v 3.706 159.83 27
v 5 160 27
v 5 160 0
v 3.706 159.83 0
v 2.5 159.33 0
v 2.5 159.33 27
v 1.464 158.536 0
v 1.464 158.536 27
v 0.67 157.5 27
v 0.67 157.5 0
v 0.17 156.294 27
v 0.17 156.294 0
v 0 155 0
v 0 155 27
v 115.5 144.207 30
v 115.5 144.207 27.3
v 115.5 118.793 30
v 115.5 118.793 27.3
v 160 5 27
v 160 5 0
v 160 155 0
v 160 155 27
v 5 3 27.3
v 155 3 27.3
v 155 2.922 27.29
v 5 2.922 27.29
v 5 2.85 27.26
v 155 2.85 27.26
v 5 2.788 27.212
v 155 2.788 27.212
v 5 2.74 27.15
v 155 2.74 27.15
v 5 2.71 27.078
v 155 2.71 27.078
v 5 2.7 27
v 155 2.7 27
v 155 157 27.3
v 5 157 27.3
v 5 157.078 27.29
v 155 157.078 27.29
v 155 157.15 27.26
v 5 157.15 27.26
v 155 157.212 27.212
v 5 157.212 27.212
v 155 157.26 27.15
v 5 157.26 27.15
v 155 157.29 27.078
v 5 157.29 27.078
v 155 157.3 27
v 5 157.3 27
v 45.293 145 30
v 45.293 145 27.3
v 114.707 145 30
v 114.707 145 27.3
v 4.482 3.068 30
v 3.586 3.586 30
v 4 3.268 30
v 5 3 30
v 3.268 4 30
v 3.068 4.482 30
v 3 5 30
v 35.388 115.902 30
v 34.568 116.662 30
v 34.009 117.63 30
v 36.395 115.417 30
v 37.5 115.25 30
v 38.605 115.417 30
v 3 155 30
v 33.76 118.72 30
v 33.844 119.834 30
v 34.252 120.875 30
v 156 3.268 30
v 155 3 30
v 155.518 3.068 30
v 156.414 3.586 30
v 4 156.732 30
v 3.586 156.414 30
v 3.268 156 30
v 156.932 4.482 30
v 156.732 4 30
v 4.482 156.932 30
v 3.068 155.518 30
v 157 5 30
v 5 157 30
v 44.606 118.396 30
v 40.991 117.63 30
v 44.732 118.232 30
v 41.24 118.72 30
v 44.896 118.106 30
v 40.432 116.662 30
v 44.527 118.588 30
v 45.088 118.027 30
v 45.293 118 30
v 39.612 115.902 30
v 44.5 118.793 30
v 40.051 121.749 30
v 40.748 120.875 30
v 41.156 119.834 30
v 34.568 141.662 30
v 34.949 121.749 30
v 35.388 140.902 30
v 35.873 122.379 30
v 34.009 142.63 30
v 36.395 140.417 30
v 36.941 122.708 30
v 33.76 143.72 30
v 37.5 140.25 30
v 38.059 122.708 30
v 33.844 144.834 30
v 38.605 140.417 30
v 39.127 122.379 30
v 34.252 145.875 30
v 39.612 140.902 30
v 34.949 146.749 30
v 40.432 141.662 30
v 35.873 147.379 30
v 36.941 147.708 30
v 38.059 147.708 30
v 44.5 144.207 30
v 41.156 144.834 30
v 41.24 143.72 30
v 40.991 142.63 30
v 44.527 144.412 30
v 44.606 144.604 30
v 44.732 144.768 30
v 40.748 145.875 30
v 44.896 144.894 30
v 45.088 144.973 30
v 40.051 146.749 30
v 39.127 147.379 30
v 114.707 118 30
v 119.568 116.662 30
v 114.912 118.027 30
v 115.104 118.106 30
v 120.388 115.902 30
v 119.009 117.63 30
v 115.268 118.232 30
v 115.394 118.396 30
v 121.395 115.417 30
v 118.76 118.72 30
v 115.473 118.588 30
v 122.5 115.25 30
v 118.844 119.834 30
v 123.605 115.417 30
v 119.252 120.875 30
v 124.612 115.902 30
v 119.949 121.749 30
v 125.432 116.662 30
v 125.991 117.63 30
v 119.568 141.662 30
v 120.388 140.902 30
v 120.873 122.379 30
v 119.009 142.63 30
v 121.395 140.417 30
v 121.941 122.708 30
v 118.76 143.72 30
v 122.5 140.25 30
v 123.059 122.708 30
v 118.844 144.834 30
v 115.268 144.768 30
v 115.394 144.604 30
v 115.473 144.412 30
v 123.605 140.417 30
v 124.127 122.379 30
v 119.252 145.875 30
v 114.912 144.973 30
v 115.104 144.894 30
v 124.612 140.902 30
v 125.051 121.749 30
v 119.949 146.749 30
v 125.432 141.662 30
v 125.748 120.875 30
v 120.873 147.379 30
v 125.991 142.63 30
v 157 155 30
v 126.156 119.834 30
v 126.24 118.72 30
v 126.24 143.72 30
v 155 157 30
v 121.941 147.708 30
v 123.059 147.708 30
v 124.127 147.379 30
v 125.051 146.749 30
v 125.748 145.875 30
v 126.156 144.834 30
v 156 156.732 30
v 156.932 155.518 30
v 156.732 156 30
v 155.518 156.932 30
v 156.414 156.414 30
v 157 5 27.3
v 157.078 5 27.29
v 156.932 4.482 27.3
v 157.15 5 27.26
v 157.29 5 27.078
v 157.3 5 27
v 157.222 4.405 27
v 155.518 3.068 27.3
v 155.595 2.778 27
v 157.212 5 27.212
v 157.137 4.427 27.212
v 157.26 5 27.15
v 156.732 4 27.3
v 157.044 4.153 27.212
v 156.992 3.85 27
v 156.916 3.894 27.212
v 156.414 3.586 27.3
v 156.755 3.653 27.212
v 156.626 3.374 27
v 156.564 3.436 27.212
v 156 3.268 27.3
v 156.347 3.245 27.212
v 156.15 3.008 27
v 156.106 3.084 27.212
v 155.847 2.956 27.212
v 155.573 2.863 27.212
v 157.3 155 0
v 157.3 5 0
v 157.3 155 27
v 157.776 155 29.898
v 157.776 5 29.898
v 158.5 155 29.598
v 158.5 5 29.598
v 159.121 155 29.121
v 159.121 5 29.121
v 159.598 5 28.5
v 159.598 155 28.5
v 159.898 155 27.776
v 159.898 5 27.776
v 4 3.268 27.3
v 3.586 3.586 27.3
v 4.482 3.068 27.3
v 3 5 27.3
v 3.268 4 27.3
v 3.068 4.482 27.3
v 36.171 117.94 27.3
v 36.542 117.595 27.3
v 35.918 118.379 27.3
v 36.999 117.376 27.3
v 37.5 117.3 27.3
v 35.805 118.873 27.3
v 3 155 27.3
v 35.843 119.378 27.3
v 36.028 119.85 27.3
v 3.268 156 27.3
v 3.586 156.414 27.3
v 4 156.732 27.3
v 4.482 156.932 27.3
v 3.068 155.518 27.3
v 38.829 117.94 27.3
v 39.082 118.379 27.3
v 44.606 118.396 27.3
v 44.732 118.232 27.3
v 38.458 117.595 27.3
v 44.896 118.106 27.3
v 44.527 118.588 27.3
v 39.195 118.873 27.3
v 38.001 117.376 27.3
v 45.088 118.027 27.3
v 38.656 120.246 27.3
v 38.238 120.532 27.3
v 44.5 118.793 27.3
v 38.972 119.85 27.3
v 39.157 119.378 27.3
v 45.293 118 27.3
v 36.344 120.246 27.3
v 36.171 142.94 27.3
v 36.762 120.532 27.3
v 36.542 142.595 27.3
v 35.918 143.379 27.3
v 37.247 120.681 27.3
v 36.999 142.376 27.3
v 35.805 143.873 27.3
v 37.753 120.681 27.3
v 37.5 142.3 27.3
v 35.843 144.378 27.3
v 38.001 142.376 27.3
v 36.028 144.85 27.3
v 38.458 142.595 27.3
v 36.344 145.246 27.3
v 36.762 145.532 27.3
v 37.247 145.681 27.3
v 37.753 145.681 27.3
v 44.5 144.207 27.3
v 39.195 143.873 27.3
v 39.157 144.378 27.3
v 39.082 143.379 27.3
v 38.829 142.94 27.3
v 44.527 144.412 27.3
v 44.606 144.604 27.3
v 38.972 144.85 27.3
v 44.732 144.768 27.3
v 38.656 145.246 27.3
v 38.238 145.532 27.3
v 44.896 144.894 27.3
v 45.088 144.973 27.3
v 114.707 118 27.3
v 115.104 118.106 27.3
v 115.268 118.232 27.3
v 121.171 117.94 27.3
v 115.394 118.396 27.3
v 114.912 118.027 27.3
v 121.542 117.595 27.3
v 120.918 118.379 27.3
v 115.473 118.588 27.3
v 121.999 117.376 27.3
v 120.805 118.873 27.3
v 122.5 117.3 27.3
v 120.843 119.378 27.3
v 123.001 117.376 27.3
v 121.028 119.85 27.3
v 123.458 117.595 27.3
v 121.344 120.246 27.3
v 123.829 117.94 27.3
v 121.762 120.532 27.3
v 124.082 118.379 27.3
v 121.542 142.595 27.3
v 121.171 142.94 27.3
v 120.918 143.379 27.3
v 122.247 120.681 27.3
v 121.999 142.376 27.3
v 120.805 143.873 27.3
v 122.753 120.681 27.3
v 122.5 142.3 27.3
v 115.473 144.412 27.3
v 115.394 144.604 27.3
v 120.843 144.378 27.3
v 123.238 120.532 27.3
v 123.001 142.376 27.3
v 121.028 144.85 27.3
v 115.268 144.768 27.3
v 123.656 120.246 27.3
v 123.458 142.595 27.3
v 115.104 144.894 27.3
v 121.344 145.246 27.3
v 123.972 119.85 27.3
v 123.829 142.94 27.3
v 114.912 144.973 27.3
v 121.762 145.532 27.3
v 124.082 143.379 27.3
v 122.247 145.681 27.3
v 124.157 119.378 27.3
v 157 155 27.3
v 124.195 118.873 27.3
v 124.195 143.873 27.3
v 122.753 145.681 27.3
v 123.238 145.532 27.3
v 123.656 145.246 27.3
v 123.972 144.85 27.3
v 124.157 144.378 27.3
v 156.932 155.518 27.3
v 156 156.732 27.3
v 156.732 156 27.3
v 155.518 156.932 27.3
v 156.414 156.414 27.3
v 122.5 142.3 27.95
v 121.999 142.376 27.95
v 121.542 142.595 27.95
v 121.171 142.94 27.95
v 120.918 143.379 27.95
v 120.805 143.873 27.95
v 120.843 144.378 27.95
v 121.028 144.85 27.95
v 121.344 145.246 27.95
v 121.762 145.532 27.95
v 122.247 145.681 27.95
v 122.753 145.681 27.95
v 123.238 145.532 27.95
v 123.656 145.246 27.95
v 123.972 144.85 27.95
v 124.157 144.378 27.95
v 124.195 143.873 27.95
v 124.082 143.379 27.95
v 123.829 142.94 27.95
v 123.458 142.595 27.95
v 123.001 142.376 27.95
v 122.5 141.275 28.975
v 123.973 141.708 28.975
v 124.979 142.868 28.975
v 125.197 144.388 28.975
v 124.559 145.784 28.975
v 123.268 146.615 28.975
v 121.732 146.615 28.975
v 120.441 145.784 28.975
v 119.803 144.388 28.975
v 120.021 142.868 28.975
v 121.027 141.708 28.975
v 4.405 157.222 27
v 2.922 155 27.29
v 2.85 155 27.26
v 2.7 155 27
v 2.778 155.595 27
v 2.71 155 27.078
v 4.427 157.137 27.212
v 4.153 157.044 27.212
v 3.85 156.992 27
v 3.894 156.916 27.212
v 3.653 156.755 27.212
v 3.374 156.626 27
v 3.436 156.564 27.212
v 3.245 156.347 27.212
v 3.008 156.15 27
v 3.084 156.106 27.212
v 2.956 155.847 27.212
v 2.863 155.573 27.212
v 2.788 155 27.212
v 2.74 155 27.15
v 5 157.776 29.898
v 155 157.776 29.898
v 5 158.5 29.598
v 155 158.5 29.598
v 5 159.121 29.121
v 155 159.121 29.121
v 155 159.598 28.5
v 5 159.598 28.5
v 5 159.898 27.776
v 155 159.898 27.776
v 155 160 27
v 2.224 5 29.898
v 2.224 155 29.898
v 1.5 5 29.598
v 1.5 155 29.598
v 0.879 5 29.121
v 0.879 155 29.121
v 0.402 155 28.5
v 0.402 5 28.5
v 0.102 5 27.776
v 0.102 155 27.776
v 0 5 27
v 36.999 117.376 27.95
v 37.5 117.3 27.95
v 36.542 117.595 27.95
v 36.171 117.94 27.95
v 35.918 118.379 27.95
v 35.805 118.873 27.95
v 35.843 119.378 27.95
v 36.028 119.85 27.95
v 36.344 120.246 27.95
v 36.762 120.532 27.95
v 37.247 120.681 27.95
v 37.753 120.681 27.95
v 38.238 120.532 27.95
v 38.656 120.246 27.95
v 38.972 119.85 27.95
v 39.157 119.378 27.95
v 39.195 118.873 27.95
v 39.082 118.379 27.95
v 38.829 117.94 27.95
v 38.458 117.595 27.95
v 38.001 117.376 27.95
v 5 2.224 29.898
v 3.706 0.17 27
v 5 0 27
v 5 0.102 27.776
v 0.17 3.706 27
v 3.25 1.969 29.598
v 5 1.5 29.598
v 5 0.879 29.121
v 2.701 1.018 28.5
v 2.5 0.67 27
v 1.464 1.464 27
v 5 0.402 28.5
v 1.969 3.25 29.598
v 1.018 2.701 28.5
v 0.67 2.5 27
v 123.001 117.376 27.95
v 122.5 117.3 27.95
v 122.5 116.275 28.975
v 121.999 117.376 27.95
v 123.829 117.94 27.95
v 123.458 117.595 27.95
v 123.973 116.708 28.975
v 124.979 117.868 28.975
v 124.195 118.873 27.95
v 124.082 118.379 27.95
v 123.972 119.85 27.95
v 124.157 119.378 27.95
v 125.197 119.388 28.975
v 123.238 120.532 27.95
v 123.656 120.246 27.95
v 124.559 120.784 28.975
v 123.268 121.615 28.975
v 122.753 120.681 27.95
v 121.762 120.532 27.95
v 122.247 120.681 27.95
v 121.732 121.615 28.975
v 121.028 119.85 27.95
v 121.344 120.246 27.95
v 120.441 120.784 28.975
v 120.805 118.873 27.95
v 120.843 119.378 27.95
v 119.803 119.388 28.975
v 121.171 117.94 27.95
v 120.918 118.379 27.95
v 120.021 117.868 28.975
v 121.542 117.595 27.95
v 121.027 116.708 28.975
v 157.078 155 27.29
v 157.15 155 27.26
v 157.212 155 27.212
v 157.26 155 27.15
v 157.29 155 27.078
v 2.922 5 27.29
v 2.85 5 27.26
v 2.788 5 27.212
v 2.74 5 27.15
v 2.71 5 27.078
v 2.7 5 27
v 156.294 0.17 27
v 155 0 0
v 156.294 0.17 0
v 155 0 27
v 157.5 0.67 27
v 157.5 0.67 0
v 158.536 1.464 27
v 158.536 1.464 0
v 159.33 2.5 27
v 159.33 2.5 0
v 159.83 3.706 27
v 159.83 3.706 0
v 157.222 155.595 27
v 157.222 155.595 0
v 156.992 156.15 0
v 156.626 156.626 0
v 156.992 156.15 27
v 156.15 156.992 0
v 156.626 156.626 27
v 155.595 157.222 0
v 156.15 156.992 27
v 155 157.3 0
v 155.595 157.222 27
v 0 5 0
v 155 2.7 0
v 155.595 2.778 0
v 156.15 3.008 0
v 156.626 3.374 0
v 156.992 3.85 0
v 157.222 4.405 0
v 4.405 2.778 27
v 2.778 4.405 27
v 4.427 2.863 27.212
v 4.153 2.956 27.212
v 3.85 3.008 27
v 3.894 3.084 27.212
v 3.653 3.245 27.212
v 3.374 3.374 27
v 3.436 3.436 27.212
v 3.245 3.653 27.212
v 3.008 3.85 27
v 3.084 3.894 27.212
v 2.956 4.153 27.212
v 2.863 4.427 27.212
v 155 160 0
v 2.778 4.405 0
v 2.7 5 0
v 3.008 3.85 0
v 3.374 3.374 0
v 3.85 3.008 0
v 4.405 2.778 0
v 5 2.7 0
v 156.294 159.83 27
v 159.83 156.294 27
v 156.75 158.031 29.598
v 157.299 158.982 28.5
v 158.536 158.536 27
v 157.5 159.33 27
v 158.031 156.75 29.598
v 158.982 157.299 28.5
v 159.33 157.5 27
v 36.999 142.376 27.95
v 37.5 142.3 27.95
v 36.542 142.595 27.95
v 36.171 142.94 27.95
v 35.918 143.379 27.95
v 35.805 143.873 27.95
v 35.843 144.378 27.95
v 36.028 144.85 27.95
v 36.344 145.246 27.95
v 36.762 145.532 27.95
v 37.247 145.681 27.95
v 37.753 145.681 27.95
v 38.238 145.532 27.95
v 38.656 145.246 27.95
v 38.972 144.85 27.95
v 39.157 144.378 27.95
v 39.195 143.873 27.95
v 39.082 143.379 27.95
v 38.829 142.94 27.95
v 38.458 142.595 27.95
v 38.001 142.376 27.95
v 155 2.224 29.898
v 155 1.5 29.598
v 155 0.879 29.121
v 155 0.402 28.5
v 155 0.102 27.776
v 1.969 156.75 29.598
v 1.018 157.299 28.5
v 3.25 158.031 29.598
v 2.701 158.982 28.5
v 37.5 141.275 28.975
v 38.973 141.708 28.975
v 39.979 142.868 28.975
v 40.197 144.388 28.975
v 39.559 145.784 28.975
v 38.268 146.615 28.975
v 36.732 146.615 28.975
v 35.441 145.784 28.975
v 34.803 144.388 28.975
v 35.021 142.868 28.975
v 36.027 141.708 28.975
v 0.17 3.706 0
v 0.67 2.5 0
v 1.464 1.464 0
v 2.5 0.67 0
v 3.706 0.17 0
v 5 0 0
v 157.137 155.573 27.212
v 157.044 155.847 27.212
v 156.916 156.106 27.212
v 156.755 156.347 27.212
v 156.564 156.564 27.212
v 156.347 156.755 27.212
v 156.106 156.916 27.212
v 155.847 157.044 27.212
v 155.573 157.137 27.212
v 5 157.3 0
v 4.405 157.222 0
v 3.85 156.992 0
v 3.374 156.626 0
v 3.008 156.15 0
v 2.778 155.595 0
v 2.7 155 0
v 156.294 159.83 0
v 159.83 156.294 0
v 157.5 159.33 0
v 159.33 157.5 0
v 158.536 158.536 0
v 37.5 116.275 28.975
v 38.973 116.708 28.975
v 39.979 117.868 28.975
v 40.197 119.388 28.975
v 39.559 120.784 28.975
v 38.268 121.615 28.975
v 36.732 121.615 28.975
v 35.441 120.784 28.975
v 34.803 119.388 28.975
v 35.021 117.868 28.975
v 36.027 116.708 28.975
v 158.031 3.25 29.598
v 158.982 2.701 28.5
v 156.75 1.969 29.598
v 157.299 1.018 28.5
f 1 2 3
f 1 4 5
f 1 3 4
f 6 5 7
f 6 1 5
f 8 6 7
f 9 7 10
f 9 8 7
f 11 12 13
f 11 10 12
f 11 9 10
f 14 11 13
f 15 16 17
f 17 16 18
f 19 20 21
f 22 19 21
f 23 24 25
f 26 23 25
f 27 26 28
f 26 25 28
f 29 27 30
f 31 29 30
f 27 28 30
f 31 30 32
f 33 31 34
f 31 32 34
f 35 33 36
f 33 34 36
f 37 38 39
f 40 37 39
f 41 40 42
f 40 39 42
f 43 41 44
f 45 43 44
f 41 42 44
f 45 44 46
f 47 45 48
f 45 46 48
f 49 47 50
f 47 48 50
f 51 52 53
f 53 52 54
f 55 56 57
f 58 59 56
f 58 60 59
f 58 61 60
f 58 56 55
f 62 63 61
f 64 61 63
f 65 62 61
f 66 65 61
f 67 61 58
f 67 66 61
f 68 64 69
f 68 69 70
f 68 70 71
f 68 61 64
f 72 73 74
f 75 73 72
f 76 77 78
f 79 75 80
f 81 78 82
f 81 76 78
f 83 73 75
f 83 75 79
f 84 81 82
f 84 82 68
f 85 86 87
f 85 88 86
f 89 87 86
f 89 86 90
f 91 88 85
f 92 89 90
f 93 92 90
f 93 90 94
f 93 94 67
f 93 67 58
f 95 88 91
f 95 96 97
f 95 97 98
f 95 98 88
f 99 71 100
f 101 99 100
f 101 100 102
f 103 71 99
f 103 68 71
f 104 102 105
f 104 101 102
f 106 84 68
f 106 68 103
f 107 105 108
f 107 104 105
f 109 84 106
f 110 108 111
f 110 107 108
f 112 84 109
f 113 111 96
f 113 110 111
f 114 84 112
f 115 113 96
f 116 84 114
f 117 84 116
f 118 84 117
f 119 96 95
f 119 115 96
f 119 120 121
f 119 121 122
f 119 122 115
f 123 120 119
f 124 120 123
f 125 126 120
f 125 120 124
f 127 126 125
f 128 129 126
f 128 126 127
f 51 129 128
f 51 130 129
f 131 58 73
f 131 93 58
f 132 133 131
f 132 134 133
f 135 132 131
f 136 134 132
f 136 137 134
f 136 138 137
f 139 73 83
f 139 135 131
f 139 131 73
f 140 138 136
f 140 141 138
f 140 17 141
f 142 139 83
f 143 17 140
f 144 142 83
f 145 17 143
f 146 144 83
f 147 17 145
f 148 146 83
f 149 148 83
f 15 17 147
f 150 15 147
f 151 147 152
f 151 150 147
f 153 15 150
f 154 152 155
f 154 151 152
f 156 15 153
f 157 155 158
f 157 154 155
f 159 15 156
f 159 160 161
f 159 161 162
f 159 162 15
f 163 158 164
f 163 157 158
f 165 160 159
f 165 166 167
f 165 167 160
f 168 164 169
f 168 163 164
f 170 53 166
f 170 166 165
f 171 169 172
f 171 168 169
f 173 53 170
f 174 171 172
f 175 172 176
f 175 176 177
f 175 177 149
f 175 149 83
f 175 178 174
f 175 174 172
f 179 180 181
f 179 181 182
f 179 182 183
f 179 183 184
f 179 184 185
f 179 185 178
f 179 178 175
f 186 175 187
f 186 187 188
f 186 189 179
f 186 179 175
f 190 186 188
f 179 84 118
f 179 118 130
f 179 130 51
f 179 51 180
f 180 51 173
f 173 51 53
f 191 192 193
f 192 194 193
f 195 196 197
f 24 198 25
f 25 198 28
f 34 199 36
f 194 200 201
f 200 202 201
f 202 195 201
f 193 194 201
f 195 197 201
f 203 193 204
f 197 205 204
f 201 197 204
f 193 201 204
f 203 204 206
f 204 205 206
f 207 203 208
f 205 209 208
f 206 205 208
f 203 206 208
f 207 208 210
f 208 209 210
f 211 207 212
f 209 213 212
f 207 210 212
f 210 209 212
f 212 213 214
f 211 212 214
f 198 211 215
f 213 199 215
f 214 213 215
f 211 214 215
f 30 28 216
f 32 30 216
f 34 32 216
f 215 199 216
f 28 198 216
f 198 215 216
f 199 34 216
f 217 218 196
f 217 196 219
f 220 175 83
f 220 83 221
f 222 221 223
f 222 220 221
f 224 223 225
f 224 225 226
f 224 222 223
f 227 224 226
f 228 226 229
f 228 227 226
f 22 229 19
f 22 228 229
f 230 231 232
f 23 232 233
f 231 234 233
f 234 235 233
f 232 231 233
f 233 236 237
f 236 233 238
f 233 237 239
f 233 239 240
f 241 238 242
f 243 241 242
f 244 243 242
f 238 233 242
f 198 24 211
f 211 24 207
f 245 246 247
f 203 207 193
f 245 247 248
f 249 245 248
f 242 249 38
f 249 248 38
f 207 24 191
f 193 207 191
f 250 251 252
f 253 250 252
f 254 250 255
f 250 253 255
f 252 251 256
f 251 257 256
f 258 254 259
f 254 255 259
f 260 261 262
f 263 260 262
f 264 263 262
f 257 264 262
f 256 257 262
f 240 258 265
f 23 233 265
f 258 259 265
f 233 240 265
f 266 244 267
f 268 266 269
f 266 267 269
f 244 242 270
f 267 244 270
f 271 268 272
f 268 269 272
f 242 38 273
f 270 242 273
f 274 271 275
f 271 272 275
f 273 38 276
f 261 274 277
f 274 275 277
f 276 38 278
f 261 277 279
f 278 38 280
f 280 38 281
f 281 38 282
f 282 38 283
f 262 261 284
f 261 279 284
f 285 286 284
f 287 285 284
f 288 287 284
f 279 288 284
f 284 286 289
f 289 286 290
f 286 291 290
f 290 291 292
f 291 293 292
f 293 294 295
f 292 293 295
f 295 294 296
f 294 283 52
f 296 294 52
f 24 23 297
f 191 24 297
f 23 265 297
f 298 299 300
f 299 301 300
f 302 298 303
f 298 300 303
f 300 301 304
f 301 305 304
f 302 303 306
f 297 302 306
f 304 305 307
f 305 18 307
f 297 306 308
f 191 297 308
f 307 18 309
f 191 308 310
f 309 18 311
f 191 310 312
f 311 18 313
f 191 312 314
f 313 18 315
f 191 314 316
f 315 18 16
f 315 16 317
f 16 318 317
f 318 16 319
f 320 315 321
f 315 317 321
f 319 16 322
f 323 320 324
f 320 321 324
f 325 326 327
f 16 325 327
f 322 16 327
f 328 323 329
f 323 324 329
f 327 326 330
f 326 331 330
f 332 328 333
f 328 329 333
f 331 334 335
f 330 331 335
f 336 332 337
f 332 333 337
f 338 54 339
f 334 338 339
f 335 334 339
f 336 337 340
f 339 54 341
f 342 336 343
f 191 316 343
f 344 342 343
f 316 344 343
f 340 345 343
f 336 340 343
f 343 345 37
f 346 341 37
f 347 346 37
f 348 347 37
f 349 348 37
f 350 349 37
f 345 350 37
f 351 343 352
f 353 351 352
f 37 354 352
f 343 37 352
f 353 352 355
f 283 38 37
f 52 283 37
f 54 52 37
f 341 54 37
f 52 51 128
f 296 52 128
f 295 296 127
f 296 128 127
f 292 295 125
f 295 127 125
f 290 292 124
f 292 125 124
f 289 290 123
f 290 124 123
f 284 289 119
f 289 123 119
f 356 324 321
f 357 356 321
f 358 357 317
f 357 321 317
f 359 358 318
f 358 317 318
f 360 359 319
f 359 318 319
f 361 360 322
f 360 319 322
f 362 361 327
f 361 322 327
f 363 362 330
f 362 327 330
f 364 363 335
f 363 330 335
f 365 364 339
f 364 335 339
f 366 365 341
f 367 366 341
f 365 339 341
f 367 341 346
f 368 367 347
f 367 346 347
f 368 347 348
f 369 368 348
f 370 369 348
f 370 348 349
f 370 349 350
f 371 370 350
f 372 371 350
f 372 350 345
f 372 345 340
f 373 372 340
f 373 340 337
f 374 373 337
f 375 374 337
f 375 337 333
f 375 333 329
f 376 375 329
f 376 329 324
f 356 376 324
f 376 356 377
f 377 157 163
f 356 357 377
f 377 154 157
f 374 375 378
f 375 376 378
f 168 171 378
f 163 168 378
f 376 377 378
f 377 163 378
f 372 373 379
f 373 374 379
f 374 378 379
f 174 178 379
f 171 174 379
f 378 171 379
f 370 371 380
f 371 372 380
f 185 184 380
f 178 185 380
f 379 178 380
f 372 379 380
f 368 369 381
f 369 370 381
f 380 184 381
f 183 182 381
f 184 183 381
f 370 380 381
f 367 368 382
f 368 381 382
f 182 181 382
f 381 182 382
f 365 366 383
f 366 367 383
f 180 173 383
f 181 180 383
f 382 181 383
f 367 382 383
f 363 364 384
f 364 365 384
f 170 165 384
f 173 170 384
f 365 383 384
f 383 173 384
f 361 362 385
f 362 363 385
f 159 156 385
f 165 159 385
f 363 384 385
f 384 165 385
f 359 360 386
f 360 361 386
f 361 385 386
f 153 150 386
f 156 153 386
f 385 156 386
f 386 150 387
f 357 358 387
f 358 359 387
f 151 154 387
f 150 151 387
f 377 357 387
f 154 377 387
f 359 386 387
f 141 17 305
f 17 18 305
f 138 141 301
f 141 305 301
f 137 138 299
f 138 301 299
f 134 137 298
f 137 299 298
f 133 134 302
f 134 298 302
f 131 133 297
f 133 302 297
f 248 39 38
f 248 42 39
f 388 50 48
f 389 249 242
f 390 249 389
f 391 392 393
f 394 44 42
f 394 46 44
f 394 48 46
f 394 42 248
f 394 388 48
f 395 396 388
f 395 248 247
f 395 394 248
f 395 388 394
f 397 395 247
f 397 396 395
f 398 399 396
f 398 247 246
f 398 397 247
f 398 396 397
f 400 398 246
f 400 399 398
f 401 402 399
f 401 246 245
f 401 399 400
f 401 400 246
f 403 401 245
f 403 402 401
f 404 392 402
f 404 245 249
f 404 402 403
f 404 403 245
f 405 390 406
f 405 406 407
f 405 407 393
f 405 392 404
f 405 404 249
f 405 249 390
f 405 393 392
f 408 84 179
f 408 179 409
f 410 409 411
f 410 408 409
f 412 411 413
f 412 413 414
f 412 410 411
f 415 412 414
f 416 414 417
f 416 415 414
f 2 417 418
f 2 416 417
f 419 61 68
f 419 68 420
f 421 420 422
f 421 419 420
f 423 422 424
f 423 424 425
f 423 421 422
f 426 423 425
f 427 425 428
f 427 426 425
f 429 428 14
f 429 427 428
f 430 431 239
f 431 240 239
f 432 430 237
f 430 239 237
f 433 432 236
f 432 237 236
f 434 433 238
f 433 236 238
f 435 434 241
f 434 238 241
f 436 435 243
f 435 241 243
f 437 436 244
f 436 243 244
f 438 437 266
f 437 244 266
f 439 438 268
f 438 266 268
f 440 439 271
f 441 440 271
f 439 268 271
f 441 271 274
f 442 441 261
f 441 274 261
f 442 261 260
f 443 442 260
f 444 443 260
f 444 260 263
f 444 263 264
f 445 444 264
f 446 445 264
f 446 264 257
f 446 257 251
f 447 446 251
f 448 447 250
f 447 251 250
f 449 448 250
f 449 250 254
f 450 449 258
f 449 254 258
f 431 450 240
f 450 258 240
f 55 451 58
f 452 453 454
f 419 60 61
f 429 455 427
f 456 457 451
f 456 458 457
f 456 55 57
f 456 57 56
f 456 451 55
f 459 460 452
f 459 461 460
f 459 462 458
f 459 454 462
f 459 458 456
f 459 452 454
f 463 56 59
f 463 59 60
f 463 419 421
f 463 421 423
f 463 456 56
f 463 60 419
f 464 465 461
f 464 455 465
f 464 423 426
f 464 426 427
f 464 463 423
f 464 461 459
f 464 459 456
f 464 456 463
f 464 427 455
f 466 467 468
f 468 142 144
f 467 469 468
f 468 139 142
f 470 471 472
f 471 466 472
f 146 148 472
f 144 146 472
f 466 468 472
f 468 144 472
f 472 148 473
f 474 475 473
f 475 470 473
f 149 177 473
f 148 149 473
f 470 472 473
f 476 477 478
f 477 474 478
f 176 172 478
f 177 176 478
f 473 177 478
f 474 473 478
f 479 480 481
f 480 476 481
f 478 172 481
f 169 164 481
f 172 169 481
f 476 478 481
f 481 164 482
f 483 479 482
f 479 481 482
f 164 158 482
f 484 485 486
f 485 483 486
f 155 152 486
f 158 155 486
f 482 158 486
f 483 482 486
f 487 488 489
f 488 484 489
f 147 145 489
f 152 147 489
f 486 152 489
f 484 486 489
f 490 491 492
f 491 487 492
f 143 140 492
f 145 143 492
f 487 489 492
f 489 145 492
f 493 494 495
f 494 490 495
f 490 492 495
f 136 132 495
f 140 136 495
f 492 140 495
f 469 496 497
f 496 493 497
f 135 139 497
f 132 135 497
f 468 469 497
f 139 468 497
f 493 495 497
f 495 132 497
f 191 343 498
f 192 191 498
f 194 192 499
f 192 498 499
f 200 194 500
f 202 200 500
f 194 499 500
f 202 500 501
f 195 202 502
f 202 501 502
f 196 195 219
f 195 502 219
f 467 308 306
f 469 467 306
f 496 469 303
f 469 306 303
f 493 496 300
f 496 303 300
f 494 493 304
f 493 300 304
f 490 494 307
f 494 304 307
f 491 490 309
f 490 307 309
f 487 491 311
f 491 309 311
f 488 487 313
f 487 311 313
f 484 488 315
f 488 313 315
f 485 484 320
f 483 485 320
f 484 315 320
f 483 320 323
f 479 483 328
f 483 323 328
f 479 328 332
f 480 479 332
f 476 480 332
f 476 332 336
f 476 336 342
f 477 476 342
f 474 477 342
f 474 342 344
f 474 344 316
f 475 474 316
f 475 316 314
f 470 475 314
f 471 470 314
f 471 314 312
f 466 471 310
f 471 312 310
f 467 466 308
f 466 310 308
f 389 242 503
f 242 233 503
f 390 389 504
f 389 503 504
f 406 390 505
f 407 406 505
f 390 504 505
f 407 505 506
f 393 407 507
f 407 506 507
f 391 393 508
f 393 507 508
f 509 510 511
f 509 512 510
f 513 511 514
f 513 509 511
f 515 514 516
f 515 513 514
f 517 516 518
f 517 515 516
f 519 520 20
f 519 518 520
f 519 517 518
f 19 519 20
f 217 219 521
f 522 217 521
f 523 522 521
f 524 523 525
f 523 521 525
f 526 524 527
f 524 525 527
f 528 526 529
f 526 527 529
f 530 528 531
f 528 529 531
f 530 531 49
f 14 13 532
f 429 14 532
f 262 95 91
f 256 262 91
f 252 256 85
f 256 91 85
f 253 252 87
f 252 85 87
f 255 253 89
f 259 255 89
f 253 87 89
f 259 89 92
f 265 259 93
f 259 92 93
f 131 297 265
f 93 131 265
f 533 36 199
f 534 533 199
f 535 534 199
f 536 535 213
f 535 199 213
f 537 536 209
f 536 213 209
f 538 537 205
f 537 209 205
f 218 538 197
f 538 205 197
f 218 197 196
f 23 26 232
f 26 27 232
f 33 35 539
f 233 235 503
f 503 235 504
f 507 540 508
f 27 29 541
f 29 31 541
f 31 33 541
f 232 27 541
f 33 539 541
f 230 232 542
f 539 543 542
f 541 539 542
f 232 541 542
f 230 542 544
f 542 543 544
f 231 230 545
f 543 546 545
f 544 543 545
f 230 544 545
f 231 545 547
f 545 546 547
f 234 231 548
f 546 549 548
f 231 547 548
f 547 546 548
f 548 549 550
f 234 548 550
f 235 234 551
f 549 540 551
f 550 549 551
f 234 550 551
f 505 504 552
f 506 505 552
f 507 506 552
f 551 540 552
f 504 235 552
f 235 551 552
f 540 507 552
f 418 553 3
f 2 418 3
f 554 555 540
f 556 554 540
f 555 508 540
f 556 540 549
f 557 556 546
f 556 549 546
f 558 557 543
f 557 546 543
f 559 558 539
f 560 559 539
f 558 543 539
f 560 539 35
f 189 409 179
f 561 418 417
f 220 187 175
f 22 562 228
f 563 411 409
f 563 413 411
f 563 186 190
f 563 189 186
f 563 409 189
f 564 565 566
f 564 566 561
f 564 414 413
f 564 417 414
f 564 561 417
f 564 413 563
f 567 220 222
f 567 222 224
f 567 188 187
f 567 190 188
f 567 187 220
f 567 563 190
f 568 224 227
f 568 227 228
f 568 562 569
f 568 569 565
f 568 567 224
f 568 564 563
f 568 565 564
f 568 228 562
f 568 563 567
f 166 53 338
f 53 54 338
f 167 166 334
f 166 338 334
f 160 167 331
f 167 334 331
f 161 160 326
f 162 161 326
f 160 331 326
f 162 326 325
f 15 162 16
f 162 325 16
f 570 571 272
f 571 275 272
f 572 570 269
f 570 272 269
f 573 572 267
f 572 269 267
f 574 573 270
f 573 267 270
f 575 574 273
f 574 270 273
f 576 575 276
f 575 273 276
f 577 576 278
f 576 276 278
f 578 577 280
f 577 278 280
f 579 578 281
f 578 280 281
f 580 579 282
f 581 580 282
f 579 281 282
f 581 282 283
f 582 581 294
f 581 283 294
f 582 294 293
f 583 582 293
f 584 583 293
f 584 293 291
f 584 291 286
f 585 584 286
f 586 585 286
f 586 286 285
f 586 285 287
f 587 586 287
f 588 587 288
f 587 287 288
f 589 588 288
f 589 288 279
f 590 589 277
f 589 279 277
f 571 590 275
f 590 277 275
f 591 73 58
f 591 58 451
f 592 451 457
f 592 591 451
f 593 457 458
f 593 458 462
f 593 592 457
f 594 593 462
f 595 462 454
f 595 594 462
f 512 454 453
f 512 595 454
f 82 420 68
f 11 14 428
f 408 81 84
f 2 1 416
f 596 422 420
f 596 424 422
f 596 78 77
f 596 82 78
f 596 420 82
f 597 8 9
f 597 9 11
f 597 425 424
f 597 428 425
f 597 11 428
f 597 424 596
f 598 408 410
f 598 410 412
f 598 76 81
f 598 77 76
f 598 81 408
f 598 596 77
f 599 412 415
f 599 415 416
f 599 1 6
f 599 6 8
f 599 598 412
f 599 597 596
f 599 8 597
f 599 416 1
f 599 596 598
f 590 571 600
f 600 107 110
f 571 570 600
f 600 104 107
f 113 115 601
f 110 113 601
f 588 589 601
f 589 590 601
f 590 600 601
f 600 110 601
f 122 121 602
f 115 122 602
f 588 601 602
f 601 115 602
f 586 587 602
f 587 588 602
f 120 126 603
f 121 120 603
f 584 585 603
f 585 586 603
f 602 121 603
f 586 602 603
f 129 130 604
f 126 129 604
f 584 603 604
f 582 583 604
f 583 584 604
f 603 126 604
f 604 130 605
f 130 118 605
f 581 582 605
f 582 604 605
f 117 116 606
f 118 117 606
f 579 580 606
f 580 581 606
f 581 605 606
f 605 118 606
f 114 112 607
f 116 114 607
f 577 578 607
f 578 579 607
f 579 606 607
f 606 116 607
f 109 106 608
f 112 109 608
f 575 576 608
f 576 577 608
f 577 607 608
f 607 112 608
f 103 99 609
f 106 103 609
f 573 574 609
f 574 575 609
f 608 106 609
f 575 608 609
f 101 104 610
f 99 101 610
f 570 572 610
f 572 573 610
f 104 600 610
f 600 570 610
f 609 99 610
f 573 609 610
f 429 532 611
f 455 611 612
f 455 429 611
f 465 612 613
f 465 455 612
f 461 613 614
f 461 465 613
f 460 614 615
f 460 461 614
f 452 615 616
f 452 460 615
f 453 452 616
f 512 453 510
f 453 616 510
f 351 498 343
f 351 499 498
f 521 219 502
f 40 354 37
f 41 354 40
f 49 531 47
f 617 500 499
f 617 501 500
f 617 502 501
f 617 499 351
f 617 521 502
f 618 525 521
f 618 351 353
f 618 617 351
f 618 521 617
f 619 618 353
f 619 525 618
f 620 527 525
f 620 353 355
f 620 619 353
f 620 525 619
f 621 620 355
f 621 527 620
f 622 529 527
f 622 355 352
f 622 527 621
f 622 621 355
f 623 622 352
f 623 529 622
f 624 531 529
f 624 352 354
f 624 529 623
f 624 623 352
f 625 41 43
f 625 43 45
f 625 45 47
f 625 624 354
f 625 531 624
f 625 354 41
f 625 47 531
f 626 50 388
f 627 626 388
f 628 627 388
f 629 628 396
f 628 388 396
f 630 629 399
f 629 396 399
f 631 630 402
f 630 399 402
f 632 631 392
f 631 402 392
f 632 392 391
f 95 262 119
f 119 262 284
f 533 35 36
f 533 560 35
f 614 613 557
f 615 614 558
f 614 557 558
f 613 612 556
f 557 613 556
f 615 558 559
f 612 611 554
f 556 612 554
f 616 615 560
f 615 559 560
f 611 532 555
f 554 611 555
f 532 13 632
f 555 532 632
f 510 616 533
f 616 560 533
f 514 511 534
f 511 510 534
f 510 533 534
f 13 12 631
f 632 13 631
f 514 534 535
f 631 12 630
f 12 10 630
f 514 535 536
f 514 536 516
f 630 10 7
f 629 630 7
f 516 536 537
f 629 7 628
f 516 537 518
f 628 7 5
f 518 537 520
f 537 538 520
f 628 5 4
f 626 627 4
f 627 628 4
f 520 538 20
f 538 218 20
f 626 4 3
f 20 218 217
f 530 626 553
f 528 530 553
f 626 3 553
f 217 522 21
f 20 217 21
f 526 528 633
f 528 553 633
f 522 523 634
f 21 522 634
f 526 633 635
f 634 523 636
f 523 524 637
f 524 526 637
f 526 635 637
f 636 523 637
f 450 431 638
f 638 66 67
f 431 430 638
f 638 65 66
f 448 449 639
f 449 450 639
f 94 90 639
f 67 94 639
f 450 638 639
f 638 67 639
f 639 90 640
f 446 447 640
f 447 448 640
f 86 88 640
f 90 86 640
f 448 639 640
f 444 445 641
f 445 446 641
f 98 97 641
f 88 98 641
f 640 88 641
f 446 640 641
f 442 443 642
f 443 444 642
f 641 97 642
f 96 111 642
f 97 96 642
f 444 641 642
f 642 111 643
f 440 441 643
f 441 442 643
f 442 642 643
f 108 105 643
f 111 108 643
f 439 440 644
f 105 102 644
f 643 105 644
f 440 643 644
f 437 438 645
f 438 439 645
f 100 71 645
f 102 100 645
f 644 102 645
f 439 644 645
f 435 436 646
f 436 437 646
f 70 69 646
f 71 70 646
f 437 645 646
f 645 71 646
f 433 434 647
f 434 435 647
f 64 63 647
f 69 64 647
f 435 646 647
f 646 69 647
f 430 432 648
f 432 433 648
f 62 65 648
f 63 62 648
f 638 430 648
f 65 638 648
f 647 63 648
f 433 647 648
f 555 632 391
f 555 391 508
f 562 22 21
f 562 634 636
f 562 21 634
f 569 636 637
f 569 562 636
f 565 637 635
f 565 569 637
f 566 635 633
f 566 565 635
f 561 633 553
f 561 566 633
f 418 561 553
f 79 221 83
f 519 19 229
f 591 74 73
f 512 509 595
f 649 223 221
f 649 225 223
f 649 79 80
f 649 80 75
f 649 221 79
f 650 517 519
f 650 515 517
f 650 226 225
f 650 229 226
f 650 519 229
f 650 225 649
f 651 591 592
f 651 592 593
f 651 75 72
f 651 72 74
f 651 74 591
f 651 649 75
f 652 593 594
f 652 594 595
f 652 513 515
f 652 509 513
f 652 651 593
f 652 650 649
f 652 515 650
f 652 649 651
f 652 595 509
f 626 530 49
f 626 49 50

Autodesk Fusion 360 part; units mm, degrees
sketch "Sketch1" plane through (0, 0, 0) normal (0, 0, 1) x (1, 0, 0)
  line L0 (0, 0) -> (160, 0)
  line L1 (160, 0) -> (160, 160)
  line L2 (160, 160) -> (0, 160)
  line L3 (0, 160) -> (0, 0)
  dimension "d1" = 160
  dimension "d3" = 160
extrude "Extrude1" add sketch "Sketch1" along normal blind 30
fillet "Fillet1" radius 5 4 edges at (0, 160, 15) (0, 0, 15) (160, 0, 15) (160, 160, 15)
fillet "Fillet1" radius 3 4 edges at (160, 80, 30) (80, 160, 30) (80, 0, 30) (0, 80, 30)
shell "Shell1" thickness 2.7 removed faces 1 at (53.3333, 51.6667, 0)
sketch "Sketch3" plane through (0, 0, 30) normal (0, 0, 1) x (-1, 0, 0)
  arc A0 (-5, -157) -> (-3, -155) centre (-5, -155) ccw
  line L0 (-3, -155) -> (-3, -5)
  arc A1 (-3, -5) -> (-5, -3) centre (-5, -5) ccw
  line L1 (-5, -3) -> (-155, -3)
  arc A2 (-155, -3) -> (-157, -5) centre (-155, -5) ccw
  line L2 (-157, -5) -> (-157, -155)
  arc A3 (-157, -155) -> (-155, -157) centre (-155, -155) ccw
  line L3 (-155, -157) -> (-5, -157)
  line L4 (-44.5, -145) -> (-115.5, -145)
  line L5 (-115.5, -145) -> (-115.5, -118)
  line L6 (-115.5, -118) -> (-44.5, -118)
  line L7 (-44.5, -118) -> (-44.5, -145)
  arc A4 (-155, 0) -> (-160, -5) centre (-155, -5) ccw
  line L8 (-160, -5) -> (-160, -155)
  arc A5 (-160, -155) -> (-155, -160) centre (-155, -155) ccw
  line L9 (-155, -160) -> (-5, -160)
  arc A6 (-5, -160) -> (0, -155) centre (-5, -155) ccw
  line L10 (0, -155) -> (0, -5)
  arc A7 (0, -5) -> (-5, 0) centre (-5, -5) ccw
  line L11 (-5, 0) -> (-155, 0)
  line L12 (-80, -145) -> (-80, -160) construction
  dimension "d11" = 71
  dimension "d12" = 27
  dimension "d13" = 15
extrude "Extrude2" cut sketch "Sketch3" along normal through all and the other way through all contours L4 L5 L6 L7
sketch "Sketch4" plane through (0, 0, 30) normal (0, 0, 1) x (-1, 0, 0)
  line L0 (-44.5, -145) -> (-44.5, -118)
  line L1 (-44.5, -118) -> (-115.5, -118)
  line L2 (-115.5, -118) -> (-115.5, -145)
  line L3 (-115.5, -145) -> (-44.5, -145)
  arc A0 (-155, 0) -> (-160, -5) centre (-155, -5) ccw
  line L4 (-160, -5) -> (-160, -155)
  arc A1 (-160, -155) -> (-155, -160) centre (-155, -155) ccw
  line L5 (-155, -160) -> (-5, -160)
  arc A2 (-5, -160) -> (0, -155) centre (-5, -155) ccw
  line L6 (0, -155) -> (0, -5)
  arc A3 (0, -5) -> (-5, 0) centre (-5, -5) ccw
  line L7 (-5, 0) -> (-155, 0)
  line L8 (-37.5, -144) -> (-122.5, -144)
  line L9 (-122.5, -144) -> (-122.5, -119)
  line L10 (-122.5, -119) -> (-37.5, -119)
  line L11 (-37.5, -119) -> (-37.5, -144)
  line L12 (-44.5, -131.5) -> (-37.5, -131.5)
  line L13 (-80, -144) -> (-80, -145)
  line L14 (-80, -118) -> (-80, -119)
  line L15 (-115.5, -131.5) -> (-122.5, -131.5)
  dimension "d31" = 85
  dimension "d32" = 25
sketch "Sketch5" plane through (0, 0, 30) normal (0, 0, 1) x (-1, 0, 0)
  line L0 (-44.5, -118) -> (-44.5, -145)
  line L1 (-44.5, -145) -> (-115.5, -145)
  line L2 (-115.5, -145) -> (-115.5, -118)
  line L3 (-115.5, -118) -> (-44.5, -118)
  arc A0 (-5, -157) -> (-3, -155) centre (-5, -155) ccw
  line L4 (-3, -155) -> (-3, -5)
  arc A1 (-3, -5) -> (-5, -3) centre (-5, -5) ccw
  line L5 (-5, -3) -> (-155, -3)
  arc A2 (-155, -3) -> (-157, -5) centre (-155, -5) ccw
  line L6 (-157, -5) -> (-157, -155)
  arc A3 (-157, -155) -> (-155, -157) centre (-155, -155) ccw
  line L7 (-155, -157) -> (-5, -157)
  circle A4 centre (-45.0613, -144.4387) radius 0.7937
  line L8 (-44.5, -145) -> (-45.0613, -144.4387)
  circle A5 centre (-114.9387, -144.4387) radius 0.7937
  line L9 (-115.5, -145) -> (-114.9387, -144.4387) construction
  dimension "d23" = 1.5875
  dimension "d24" = 45
  dimension "d25" = 1.5875
extrude "Extrude3" [suppressed]
ref_plane "WorkPlane1" through (80, 131.5, 28.65) normal (0, -1, 0) x (-1, 0, 0)
mirror "Mirror1" [suppressed]
fillet "Fillet2" radius 0.793 4 edges at (44.5, 145, 28.65) (115.5, 145, 28.65) (115.5, 118, 28.65) (44.5, 118, 28.65)
hole "Hole1" at (122.5, 144, 30) at (122.5, 119, 30) at (37.5, 119, 30) at (37.5, 144, 30) direction (0, 0, -1) diameter 3.4 depth 15 tip angle 118 countersink diameter 7.5 countersink angle 90
equation "d1 = Lid_X"
equation "d3 = Lid_Y"
equation "d4 = Lid_Z"
equation "d8 = Lid_Thikness"
equation "d11 = Opening_X"
equation "d12 = Opening_Y"
equation "d23 = ( 1 / 16 ) * 1 in"
equation "d25 = 1 / 16 * 1 in"
equation "d30 = Corner_rad"
equation "d31 = Holes_X"
equation "d32 = Holes_Y"
equation "Lid_X = 160 mm"
equation "Lid_Y = 160 mm"
equation "Lid_Z = 30 mm"
equation "Opening_X = 71 mm"
equation "Opening_Y = 27 mm"
equation "Lid_Thikness = 2.7 mm"
equation "Corner_rad = 0.793 mm"
equation "Holes_X = 85 mm"
equation "Holes_Y = 25 mm"
